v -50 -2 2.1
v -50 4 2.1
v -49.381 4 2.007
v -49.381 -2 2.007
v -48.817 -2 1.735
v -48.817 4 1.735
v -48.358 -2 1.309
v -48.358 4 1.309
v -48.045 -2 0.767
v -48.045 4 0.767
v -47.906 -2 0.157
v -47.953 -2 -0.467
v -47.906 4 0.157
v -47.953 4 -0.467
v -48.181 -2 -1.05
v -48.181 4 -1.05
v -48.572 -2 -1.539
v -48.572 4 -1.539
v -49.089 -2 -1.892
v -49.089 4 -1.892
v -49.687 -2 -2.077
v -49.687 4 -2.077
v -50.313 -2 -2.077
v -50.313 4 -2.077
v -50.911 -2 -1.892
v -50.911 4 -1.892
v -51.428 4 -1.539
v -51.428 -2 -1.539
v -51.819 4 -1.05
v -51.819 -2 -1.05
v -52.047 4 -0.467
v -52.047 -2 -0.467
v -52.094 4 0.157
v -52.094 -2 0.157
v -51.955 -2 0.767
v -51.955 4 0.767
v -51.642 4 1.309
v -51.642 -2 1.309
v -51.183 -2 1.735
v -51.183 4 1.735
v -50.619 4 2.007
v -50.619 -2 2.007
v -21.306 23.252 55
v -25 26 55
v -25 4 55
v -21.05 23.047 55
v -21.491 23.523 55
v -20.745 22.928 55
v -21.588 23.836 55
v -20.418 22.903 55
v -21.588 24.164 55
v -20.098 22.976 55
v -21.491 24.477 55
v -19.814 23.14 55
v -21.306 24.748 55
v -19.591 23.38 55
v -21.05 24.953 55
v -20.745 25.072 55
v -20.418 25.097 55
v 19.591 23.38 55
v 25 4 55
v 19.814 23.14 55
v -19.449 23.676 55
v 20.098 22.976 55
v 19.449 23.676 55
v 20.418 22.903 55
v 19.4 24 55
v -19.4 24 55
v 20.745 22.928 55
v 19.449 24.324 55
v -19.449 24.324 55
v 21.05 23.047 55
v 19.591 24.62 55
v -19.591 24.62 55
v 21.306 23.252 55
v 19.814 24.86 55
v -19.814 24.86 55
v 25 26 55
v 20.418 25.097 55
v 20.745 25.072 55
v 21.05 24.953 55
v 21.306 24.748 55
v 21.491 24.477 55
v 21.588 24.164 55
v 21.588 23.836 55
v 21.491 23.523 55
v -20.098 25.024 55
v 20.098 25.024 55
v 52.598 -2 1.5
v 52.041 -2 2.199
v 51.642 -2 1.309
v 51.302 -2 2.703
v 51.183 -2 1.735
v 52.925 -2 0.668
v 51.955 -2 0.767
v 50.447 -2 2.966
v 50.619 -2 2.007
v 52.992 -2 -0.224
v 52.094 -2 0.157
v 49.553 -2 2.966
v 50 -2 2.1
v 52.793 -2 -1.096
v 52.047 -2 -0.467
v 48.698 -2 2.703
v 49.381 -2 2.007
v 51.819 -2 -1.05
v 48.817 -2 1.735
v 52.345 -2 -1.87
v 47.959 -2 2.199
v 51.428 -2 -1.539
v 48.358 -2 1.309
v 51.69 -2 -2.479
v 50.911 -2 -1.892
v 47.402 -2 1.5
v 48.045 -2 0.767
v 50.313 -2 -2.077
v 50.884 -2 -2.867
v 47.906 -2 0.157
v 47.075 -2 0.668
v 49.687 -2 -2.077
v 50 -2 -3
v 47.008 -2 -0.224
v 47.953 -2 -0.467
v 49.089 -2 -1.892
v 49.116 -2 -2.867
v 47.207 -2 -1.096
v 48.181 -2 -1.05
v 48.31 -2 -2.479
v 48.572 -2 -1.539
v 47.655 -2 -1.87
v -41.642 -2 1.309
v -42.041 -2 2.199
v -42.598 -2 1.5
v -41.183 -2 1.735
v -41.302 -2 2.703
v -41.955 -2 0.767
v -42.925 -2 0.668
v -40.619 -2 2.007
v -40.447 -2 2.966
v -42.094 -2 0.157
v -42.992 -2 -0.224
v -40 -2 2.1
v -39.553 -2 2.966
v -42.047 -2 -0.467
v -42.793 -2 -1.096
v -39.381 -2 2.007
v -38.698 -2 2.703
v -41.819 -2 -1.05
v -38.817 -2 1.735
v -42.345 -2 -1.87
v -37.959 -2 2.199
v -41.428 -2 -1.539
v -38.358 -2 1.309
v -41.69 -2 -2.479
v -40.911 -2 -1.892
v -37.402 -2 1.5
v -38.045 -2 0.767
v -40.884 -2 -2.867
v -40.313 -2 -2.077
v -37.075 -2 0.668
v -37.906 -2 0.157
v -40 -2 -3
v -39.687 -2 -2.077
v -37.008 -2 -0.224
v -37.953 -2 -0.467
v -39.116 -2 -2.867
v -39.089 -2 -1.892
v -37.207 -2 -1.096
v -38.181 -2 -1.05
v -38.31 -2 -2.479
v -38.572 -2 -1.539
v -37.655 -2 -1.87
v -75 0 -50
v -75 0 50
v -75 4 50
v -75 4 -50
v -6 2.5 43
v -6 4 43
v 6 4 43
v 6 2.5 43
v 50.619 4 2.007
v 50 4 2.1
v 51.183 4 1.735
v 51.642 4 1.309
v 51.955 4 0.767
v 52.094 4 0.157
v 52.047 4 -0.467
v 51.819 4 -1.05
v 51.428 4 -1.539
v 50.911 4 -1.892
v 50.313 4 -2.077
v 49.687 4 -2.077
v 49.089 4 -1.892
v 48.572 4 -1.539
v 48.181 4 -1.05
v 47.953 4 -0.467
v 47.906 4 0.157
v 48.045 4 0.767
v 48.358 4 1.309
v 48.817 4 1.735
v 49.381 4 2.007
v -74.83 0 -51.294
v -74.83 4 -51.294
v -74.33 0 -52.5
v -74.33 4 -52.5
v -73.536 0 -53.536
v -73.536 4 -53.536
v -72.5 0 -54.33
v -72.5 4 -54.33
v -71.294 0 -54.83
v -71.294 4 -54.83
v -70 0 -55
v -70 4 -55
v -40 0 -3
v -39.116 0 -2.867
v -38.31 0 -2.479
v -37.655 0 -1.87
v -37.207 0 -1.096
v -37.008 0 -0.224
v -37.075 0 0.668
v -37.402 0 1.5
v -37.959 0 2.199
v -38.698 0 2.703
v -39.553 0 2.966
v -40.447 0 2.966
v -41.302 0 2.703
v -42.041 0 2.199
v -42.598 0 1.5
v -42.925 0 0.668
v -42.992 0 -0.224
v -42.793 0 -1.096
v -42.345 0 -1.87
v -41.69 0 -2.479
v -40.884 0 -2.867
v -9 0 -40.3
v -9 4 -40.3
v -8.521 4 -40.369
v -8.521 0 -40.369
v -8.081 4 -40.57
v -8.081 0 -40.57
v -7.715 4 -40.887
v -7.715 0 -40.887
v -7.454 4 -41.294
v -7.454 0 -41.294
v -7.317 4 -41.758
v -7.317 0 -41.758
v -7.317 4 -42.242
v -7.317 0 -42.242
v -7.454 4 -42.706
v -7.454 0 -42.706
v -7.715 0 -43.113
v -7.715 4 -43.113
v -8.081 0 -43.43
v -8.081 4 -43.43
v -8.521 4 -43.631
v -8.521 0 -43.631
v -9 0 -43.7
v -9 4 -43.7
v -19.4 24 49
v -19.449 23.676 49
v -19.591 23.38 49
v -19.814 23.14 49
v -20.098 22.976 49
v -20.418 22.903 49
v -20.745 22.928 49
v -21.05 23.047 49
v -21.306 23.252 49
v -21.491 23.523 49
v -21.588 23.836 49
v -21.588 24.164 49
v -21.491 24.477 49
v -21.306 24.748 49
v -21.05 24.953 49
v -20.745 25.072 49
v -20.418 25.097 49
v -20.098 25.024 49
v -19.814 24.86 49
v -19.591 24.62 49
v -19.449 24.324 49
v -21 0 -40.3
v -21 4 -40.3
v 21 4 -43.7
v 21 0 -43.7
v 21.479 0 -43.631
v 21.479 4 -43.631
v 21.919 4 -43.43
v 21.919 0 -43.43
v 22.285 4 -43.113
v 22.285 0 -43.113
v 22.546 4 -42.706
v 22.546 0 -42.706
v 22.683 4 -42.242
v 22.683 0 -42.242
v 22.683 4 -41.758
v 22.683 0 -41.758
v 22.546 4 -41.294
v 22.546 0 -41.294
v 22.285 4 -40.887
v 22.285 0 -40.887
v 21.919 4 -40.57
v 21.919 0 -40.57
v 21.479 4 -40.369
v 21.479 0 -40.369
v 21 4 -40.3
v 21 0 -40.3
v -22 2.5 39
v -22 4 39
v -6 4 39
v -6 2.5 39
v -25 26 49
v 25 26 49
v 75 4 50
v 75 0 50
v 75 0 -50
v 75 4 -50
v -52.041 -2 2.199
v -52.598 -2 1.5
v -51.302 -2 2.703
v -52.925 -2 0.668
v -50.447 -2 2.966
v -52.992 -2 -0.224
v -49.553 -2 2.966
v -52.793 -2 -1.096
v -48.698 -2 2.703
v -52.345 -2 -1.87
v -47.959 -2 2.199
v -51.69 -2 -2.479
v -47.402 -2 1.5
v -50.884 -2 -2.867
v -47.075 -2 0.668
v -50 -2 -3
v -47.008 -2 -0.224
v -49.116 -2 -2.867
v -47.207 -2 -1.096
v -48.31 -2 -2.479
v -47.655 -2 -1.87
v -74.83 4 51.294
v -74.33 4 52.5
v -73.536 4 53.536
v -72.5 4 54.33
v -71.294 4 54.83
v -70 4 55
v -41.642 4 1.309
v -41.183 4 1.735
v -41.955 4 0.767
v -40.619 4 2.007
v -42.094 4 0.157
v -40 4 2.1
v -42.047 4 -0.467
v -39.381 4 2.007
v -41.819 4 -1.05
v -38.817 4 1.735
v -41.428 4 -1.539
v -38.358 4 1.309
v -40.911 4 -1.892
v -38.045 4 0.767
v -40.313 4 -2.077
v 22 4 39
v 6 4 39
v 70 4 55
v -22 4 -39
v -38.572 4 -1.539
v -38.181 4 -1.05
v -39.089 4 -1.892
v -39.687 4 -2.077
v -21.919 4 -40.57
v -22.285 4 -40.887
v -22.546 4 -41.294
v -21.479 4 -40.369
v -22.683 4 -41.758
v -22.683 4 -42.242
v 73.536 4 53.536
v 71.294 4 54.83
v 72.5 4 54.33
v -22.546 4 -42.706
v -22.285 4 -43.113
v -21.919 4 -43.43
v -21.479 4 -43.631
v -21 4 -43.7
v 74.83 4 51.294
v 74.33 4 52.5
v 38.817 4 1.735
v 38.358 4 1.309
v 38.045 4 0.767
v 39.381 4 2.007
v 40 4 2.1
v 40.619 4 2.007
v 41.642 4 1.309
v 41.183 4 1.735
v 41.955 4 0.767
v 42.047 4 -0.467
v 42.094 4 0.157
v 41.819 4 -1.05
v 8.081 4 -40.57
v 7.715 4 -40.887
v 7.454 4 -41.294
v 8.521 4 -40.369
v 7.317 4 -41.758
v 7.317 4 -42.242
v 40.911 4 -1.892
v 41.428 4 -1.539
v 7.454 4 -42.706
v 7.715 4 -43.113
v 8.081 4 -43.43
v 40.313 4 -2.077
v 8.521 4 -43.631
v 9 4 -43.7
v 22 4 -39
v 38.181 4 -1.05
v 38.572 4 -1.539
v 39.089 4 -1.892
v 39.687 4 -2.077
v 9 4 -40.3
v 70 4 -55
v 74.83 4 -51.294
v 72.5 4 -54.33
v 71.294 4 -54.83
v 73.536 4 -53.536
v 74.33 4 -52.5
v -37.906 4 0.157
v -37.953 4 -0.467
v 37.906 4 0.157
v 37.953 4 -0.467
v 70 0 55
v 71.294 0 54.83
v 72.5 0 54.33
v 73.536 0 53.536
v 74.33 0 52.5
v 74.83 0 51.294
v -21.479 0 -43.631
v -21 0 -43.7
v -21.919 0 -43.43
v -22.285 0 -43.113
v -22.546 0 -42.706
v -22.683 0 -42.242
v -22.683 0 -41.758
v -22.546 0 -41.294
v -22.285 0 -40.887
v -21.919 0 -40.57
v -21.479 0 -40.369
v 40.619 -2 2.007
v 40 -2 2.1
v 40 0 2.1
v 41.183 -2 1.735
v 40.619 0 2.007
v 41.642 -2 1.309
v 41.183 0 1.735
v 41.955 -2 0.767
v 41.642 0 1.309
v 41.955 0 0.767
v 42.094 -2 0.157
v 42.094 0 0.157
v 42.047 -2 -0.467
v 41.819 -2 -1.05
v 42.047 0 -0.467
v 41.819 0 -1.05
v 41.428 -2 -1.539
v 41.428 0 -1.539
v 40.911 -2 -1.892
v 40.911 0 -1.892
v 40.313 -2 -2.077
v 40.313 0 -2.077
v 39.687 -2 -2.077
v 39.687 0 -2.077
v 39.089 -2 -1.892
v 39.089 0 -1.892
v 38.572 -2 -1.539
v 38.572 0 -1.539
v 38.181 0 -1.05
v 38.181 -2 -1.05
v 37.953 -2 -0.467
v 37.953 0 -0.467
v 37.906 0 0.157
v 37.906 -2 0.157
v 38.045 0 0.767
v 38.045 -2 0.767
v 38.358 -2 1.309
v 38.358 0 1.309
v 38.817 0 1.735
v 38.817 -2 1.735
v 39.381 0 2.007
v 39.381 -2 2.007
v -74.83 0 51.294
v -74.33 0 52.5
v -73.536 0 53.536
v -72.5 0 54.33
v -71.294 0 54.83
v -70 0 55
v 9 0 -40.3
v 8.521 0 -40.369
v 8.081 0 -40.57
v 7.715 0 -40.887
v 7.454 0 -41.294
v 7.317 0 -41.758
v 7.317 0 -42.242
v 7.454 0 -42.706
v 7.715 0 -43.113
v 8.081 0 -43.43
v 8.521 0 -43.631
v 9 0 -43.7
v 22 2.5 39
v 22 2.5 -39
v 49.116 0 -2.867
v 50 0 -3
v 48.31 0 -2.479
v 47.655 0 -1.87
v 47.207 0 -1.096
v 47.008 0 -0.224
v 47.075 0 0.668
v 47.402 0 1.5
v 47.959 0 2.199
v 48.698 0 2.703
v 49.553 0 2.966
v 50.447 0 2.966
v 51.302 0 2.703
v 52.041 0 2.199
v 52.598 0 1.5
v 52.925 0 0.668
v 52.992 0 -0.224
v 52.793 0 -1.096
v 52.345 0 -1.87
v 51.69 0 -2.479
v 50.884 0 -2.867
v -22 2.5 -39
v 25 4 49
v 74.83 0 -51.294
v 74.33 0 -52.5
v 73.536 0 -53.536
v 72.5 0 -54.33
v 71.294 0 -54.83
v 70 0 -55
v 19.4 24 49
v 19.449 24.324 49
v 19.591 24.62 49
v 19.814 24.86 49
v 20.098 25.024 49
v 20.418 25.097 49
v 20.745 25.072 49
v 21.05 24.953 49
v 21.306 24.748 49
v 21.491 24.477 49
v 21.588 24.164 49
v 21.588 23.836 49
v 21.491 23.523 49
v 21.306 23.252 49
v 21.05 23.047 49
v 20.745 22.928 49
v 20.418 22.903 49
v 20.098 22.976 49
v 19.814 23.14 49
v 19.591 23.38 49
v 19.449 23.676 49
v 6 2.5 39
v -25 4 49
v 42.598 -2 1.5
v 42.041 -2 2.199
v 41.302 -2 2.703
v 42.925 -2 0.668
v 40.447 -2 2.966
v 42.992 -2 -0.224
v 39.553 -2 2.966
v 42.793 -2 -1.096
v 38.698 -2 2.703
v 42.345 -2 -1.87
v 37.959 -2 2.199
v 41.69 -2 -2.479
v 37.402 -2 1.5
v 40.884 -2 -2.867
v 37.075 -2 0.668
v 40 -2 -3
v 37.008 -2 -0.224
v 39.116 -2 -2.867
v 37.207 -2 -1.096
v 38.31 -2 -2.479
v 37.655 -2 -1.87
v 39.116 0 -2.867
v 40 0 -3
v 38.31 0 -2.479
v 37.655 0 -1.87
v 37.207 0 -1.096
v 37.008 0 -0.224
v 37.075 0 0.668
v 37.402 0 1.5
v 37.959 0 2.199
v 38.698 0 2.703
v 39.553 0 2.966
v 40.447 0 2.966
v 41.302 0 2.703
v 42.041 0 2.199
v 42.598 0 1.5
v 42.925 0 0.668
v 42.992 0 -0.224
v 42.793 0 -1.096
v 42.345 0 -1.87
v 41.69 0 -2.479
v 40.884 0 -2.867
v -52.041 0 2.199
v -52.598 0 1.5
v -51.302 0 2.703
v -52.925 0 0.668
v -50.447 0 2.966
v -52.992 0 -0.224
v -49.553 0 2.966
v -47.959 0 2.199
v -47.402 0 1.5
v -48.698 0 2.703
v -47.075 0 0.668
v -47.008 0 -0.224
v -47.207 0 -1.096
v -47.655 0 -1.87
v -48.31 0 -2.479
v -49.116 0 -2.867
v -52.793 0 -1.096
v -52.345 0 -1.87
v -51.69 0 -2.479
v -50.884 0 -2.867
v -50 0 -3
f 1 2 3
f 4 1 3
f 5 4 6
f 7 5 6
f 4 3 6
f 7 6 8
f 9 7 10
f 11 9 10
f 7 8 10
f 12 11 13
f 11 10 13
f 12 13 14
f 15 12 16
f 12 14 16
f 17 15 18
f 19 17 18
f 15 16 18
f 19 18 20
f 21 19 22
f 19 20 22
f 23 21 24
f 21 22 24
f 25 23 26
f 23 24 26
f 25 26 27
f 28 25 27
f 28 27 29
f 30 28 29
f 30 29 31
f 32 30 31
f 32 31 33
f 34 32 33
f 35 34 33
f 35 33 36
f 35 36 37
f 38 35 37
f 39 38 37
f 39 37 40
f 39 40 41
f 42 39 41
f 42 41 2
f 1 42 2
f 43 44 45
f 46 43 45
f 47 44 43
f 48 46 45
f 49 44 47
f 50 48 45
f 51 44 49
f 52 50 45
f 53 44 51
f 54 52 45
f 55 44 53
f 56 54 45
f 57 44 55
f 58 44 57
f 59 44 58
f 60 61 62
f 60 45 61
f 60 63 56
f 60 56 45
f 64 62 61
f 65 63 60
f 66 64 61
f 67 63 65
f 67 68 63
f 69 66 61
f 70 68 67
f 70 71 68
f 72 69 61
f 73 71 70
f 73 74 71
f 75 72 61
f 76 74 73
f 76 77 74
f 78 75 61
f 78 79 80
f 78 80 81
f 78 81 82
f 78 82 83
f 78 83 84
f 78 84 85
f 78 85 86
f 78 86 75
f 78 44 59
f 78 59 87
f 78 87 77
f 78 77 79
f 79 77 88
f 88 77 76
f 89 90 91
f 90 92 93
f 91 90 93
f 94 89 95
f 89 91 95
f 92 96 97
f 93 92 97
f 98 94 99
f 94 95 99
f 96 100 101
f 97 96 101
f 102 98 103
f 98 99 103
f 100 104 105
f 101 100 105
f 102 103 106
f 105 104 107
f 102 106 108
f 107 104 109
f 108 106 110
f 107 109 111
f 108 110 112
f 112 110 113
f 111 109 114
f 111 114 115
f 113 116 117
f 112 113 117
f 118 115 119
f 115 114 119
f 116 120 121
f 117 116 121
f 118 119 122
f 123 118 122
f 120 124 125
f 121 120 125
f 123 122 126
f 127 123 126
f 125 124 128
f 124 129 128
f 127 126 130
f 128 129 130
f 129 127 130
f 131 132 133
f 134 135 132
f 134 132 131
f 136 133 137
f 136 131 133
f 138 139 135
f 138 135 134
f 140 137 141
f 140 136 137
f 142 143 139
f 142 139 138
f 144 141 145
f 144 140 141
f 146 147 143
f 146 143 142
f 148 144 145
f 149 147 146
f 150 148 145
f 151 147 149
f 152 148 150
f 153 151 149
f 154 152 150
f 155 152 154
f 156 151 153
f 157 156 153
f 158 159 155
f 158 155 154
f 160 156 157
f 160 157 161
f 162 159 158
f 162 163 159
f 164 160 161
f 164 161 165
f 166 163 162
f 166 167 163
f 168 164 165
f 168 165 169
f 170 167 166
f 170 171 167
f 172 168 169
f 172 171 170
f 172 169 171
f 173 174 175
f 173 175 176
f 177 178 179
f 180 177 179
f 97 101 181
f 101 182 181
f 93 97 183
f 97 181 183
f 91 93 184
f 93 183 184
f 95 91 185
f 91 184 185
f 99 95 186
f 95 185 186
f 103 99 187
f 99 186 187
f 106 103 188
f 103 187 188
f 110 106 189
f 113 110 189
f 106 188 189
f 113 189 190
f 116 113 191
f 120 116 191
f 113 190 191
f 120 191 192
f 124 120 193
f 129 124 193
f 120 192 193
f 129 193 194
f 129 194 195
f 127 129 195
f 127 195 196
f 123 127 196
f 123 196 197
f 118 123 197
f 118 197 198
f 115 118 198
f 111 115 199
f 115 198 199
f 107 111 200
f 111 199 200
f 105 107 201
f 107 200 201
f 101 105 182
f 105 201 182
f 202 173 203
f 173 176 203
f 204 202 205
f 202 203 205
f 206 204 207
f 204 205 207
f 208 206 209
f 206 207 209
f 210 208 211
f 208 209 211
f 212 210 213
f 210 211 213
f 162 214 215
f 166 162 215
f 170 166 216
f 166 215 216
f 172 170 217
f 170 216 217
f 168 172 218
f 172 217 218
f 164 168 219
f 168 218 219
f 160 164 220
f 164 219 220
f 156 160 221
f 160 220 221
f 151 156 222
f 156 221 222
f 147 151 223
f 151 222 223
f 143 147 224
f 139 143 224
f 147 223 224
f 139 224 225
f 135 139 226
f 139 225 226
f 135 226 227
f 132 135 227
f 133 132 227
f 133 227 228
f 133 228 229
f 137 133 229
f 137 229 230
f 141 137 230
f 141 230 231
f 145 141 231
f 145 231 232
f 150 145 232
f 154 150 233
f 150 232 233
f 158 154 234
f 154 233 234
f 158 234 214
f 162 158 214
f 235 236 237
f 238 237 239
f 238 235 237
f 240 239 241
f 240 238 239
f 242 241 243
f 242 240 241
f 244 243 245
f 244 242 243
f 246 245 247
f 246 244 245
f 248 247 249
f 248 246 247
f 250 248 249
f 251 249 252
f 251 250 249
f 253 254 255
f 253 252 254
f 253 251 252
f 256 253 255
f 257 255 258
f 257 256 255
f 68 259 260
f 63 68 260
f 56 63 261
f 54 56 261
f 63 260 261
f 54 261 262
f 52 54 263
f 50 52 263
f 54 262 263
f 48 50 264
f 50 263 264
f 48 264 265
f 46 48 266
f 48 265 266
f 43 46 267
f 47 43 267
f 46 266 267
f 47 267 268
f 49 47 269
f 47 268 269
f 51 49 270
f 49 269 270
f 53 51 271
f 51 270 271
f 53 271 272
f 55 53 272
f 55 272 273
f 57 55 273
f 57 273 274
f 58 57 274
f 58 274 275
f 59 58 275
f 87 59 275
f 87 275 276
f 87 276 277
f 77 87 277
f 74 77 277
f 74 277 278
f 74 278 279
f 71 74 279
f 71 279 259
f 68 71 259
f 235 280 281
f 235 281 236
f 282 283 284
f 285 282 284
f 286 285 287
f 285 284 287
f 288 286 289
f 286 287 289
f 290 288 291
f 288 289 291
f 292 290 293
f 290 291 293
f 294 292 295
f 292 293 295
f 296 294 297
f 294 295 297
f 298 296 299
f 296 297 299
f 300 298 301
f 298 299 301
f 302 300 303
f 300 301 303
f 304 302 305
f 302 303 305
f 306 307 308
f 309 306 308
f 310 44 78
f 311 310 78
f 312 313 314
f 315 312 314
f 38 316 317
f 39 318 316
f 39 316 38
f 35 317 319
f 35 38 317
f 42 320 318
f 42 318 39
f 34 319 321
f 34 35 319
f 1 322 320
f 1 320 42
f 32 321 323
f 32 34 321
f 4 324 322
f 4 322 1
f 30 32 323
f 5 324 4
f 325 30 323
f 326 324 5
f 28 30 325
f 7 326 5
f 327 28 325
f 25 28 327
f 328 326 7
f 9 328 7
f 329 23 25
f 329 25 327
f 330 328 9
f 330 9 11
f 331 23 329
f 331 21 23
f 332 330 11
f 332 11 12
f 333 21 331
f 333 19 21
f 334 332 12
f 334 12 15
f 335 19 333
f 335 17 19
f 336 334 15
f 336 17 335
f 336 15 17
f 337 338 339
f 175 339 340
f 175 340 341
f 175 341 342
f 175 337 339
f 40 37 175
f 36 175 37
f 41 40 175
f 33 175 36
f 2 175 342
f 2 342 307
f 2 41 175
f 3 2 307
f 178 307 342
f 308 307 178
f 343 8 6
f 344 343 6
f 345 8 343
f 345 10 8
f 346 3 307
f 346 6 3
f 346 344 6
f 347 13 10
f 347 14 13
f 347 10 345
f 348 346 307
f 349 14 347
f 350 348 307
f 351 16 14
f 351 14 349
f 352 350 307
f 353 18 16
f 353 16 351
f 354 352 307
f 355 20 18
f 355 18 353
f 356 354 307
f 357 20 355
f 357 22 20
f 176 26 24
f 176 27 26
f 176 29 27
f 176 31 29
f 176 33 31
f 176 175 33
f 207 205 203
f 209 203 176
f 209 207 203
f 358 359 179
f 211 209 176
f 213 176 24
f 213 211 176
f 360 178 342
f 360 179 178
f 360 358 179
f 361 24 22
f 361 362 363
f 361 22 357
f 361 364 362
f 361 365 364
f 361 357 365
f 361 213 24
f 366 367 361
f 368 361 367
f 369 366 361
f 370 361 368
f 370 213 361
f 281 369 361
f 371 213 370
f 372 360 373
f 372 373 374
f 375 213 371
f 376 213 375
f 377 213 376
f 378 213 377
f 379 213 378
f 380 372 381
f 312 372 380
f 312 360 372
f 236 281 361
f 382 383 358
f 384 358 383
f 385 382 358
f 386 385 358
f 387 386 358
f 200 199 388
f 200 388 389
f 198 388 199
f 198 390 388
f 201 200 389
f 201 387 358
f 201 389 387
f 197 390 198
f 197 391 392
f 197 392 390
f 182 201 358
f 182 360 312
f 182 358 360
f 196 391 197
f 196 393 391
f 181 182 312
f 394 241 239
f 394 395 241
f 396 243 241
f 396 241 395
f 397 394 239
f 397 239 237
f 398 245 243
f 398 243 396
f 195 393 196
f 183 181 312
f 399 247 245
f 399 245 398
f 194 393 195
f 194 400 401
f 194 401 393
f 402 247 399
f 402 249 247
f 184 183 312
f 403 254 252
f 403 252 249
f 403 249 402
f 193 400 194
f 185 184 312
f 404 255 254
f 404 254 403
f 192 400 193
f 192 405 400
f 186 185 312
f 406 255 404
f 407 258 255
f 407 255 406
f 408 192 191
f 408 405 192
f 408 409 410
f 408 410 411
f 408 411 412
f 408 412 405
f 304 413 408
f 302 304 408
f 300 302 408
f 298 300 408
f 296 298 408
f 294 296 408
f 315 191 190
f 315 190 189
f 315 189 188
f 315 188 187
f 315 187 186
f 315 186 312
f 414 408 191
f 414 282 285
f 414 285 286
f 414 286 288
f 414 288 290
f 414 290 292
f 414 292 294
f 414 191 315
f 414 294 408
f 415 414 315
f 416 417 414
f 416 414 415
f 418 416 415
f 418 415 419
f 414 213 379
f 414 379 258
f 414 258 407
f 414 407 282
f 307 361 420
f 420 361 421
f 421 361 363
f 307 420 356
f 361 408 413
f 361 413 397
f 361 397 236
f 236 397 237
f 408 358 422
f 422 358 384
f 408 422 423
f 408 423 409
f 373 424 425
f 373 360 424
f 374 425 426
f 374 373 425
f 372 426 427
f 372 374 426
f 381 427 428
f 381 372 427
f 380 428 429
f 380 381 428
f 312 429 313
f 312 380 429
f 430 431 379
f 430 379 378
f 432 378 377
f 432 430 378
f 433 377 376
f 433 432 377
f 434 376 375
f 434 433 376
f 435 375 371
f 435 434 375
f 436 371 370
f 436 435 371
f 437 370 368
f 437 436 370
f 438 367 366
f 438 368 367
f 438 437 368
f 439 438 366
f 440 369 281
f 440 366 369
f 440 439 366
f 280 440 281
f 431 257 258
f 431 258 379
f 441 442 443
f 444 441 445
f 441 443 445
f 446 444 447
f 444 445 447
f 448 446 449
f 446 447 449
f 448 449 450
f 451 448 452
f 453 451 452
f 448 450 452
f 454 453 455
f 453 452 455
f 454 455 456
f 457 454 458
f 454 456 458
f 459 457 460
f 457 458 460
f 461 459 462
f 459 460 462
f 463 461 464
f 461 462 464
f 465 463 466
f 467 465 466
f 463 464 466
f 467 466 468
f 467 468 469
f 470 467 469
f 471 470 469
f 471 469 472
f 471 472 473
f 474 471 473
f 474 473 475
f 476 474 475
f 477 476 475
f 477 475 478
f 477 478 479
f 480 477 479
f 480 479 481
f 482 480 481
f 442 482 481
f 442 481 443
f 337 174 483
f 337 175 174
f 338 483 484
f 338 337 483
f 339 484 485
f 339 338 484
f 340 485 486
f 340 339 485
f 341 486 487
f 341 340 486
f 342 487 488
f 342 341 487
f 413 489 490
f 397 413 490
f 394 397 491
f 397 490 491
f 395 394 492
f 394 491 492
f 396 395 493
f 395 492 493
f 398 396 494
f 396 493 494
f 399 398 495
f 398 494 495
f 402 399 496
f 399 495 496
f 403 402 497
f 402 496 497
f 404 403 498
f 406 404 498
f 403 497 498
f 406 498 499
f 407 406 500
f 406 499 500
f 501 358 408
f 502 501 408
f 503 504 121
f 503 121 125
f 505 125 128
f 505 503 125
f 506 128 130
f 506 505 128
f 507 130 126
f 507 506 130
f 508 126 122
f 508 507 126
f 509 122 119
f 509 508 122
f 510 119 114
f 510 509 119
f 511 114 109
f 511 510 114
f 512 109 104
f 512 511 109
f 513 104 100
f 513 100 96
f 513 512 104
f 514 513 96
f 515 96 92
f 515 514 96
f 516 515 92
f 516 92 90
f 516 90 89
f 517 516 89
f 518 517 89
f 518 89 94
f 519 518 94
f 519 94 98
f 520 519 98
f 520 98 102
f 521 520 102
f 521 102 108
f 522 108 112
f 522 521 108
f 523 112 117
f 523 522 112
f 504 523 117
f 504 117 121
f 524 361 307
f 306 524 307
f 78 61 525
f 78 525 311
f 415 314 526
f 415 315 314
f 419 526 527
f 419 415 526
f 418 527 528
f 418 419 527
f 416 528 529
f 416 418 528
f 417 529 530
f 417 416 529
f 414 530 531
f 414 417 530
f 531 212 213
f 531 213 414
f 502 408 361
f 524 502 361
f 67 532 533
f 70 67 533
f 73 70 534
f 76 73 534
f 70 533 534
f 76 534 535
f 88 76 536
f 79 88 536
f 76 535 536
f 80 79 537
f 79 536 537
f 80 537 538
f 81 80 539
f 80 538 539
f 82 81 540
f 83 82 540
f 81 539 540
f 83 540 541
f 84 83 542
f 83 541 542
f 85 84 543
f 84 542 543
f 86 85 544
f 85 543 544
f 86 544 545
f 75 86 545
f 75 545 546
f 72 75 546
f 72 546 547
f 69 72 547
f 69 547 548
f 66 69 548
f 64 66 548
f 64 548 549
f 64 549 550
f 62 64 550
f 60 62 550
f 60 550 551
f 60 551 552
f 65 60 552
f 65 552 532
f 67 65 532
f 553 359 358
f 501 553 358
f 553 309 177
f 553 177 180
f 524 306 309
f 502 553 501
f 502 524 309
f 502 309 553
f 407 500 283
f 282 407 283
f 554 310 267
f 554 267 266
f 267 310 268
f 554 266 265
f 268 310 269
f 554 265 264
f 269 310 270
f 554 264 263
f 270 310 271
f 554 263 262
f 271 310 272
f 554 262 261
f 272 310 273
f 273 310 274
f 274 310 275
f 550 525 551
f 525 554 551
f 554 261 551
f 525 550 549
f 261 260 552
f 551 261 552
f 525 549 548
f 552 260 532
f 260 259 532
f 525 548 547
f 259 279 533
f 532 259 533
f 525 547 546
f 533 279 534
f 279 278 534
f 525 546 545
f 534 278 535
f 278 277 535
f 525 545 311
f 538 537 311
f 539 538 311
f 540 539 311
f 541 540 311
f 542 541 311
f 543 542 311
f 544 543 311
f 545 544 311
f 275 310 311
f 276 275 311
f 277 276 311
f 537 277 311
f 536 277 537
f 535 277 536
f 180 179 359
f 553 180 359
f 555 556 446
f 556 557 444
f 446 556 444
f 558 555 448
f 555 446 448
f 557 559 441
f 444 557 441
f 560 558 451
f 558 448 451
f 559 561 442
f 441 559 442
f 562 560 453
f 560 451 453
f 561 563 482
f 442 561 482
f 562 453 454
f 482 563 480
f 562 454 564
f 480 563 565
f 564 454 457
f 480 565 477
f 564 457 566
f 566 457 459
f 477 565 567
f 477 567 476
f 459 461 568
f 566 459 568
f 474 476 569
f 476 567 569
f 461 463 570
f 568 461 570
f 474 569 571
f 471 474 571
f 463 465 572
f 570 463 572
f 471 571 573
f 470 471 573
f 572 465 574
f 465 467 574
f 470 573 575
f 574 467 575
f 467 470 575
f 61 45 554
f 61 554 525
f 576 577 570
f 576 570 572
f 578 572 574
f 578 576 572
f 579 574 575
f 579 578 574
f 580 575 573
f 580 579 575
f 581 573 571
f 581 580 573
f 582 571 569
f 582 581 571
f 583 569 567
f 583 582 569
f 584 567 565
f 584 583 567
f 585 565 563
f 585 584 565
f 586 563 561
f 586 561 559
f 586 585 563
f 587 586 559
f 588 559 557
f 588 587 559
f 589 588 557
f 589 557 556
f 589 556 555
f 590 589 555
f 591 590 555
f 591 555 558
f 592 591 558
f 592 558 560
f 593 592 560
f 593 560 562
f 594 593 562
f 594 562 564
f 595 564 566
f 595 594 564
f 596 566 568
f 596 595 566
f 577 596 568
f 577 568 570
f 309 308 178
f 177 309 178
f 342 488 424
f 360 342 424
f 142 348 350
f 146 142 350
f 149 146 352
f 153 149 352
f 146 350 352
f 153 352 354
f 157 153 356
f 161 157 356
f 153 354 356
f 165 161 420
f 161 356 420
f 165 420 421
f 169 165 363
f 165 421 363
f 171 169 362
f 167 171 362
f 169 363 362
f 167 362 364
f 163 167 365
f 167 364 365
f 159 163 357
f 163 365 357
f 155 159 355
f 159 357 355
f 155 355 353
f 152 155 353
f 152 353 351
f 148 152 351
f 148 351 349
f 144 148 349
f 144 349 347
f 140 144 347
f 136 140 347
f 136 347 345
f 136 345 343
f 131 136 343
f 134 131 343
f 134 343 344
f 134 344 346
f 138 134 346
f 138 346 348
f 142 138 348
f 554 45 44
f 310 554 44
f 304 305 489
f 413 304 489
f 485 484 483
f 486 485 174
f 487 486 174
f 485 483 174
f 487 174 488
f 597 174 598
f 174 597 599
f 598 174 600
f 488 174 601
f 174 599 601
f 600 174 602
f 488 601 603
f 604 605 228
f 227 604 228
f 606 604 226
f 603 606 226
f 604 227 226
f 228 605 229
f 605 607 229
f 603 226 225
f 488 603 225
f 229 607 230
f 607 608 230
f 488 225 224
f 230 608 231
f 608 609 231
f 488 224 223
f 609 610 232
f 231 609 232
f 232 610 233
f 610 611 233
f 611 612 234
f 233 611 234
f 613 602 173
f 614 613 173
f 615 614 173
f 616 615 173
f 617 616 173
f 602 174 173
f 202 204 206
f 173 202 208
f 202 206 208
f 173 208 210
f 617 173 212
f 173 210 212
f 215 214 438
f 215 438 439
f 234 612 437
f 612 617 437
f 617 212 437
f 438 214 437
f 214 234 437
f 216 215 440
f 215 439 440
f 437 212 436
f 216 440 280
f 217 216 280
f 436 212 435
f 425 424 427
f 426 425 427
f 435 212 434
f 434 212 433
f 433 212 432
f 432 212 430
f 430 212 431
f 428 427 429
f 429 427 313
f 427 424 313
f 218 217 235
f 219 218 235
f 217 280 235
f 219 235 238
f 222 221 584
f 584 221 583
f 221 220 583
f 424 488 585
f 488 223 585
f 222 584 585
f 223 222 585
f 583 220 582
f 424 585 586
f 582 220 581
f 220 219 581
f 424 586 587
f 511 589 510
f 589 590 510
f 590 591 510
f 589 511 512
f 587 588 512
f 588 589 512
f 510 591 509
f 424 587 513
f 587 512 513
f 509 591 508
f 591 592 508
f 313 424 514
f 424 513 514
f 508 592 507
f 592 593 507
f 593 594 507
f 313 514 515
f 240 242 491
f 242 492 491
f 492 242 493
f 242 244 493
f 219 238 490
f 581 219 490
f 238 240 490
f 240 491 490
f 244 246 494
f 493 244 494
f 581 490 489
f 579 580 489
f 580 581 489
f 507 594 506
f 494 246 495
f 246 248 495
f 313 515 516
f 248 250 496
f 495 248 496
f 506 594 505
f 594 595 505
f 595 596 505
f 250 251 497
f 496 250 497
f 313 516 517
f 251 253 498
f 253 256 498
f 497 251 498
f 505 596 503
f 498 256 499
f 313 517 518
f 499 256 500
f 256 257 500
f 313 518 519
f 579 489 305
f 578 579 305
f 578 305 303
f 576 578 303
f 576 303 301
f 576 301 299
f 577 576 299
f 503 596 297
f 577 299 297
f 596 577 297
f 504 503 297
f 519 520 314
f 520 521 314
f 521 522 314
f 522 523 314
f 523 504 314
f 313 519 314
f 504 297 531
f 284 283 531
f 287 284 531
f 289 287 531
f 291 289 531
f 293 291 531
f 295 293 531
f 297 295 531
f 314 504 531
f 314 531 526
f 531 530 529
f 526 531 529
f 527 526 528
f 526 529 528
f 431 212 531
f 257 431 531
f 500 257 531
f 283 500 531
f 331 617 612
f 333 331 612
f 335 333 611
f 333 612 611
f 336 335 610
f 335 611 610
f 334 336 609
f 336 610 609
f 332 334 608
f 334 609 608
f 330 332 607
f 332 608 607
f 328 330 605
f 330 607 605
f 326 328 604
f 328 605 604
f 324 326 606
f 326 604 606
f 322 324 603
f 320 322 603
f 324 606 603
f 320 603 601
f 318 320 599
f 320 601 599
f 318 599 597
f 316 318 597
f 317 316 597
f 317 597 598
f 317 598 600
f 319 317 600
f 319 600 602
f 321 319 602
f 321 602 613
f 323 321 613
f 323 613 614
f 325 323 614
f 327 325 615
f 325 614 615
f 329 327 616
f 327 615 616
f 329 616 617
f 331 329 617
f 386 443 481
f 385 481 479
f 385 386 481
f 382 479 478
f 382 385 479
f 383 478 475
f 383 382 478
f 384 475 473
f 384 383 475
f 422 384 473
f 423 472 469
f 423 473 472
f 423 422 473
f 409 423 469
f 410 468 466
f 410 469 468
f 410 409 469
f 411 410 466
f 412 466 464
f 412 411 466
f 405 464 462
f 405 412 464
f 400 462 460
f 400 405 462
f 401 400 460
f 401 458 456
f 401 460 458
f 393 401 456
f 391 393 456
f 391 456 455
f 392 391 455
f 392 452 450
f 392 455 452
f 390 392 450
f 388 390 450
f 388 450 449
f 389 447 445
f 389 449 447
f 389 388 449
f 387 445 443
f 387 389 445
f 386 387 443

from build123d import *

# Parameters (mm, degrees)
SKETCH1_W           = 150
SKETCH1_H           = 110
BOSS_EXTRUDE1_DEPTH = 4
FILLET1_R           = 5
SKETCH2_R           = 2.1
CUT_EXTRUDE1_DEPTH  = 94.091352982
SKETCH3_R           = 3
BOSS_EXTRUDE2_DEPTH = 2
CUT_EXTRUDE2_DEPTH  = 1.5
SKETCH7_W           = 50
SKETCH7_H           = 22
BOSS_EXTRUDE4_DEPTH = 6
SKETCH8_R           = 1.1
CUT_EXTRUDE3_DEPTH  = 131.831953284
CUT_EXTRUDE4_DEPTH  = 97.571217244
SKETCH10_R          = 2.1
CUT_EXTRUDE5_DEPTH  = 96.571962416


with BuildPart() as part:
    # Sketch1 → Boss-Extrude1 (new body)
    with BuildSketch(Plane(origin=(0, 0, 0), x_dir=(1, 0, 0), z_dir=(0, 1, 0))):
        Rectangle(SKETCH1_W, SKETCH1_H)
    extrude(amount=BOSS_EXTRUDE1_DEPTH)

    # Fillet1
    fillet1_edges = [part.edges().sort_by_distance(p)[0] for p in [
        (75, 2, 55),
        (-75, 2, 55),
        (-75, 2, -55),
        (75, 2, -55),
    ]]
    fillet(fillet1_edges, radius=FILLET1_R)

    # Sketch2 → Cut-Extrude1 (cut, through all)
    with BuildSketch(Plane(origin=(0, 4, 0), x_dir=(1, 0, 0), z_dir=(0, 1, 0))):
        with Locations(Location((-50, 0, 0), (0, 0, 270))):
            Circle(SKETCH2_R)
        with Locations(Location((-40, 0, 0), (0, 0, 270))):
            Circle(SKETCH2_R)
    cut_extrude1 = extrude(amount=-CUT_EXTRUDE1_DEPTH, mode=Mode.SUBTRACT)

    # Sketch3 → Boss-Extrude2 (add)
    with BuildSketch(Plane.XZ):
        with Locations(Location((-50, 0, 0), (0, 0, 270))):
            Circle(SKETCH3_R)
        with Locations(Location((-40, 0, 0), (0, 0, 270))):
            Circle(SKETCH3_R)
    boss_extrude2 = extrude(amount=BOSS_EXTRUDE2_DEPTH)

    # Mirror1: Cut-Extrude1, Boss-Extrude2 across plane
    add(cut_extrude1.mirror(Plane(origin=(0, 0, 0), x_dir=(0, 0, 1), z_dir=(1, 0, 0))), mode=Mode.SUBTRACT)
    add(boss_extrude2.mirror(Plane(origin=(0, 0, 0), x_dir=(0, 0, 1), z_dir=(1, 0, 0))))

    # Sketch4 → Cut-Extrude2 (cut)
    with BuildSketch(Plane(origin=(0, 4, 0), x_dir=(1, 0, 0), z_dir=(0, 1, 0))):
        Polygon((-22, -39), (-6, -39), (-6, -43), (6, -43), (6, -39), (22, -39), (22, 39), (-22, 39), align=None)
    extrude(amount=-CUT_EXTRUDE2_DEPTH, mode=Mode.SUBTRACT)

    # Sketch9 → Cut-Extrude4 (cut, through all)
    with BuildSketch(Plane.XZ):
        with BuildLine():
            Line((-21, -40.3), (-9, -40.3))
            ThreePointArc((-9, -40.3), (-7.3, -42), (-9, -43.7))
            Line((-9, -43.7), (-21, -43.7))
            ThreePointArc((-21, -43.7), (-22.7, -42), (-21, -40.3))
        make_face()
        with BuildLine():
            Line((21, -40.3), (9, -40.3))
            ThreePointArc((9, -40.3), (7.3, -42), (9, -43.7))
            Line((9, -43.7), (21, -43.7))
            ThreePointArc((21, -43.7), (22.7, -42), (21, -40.3))
        make_face()
    extrude(amount=-CUT_EXTRUDE4_DEPTH, mode=Mode.SUBTRACT)

    # Sketch10 → Cut-Extrude5 (cut, through all)
    with BuildSketch(Plane(origin=(0, 4, 0), x_dir=(1, 0, 0), z_dir=(0, 1, 0))):
        with Locations(Location((-50, 0, 0), (0, 0, 270))):
            Circle(SKETCH10_R)
        with Locations(Location((-40, 0, 0), (0, 0, 270))):
            Circle(SKETCH10_R)
        with Locations(Location((40, 0, 0), (0, 0, 270))):
            Circle(SKETCH10_R)
        with Locations(Location((50, 0, 0), (0, 0, 270))):
            Circle(SKETCH10_R)
    extrude(amount=-CUT_EXTRUDE5_DEPTH, mode=Mode.SUBTRACT)


with BuildPart() as body_2:
    # Sketch7 → Boss-Extrude4 (new body)
    with BuildSketch(Plane.XY.offset(55)):
        with Locations((0, 15)):
            Rectangle(SKETCH7_W, SKETCH7_H)
    extrude(amount=-BOSS_EXTRUDE4_DEPTH)

    # Sketch8 → Cut-Extrude3 (cut, through all)
    with BuildSketch(Plane(origin=(0, 0, 49), x_dir=(-1, 0, 0), z_dir=(0, 0, -1))):
        with Locations((-20.5, 24)):
            Circle(SKETCH8_R)
        with Locations(Location((20.5, 24, 0), (0, 0, 180))):
            Circle(SKETCH8_R)
    extrude(amount=-CUT_EXTRUDE3_DEPTH, mode=Mode.SUBTRACT)


solid = Compound([part.part, body_2.part])
